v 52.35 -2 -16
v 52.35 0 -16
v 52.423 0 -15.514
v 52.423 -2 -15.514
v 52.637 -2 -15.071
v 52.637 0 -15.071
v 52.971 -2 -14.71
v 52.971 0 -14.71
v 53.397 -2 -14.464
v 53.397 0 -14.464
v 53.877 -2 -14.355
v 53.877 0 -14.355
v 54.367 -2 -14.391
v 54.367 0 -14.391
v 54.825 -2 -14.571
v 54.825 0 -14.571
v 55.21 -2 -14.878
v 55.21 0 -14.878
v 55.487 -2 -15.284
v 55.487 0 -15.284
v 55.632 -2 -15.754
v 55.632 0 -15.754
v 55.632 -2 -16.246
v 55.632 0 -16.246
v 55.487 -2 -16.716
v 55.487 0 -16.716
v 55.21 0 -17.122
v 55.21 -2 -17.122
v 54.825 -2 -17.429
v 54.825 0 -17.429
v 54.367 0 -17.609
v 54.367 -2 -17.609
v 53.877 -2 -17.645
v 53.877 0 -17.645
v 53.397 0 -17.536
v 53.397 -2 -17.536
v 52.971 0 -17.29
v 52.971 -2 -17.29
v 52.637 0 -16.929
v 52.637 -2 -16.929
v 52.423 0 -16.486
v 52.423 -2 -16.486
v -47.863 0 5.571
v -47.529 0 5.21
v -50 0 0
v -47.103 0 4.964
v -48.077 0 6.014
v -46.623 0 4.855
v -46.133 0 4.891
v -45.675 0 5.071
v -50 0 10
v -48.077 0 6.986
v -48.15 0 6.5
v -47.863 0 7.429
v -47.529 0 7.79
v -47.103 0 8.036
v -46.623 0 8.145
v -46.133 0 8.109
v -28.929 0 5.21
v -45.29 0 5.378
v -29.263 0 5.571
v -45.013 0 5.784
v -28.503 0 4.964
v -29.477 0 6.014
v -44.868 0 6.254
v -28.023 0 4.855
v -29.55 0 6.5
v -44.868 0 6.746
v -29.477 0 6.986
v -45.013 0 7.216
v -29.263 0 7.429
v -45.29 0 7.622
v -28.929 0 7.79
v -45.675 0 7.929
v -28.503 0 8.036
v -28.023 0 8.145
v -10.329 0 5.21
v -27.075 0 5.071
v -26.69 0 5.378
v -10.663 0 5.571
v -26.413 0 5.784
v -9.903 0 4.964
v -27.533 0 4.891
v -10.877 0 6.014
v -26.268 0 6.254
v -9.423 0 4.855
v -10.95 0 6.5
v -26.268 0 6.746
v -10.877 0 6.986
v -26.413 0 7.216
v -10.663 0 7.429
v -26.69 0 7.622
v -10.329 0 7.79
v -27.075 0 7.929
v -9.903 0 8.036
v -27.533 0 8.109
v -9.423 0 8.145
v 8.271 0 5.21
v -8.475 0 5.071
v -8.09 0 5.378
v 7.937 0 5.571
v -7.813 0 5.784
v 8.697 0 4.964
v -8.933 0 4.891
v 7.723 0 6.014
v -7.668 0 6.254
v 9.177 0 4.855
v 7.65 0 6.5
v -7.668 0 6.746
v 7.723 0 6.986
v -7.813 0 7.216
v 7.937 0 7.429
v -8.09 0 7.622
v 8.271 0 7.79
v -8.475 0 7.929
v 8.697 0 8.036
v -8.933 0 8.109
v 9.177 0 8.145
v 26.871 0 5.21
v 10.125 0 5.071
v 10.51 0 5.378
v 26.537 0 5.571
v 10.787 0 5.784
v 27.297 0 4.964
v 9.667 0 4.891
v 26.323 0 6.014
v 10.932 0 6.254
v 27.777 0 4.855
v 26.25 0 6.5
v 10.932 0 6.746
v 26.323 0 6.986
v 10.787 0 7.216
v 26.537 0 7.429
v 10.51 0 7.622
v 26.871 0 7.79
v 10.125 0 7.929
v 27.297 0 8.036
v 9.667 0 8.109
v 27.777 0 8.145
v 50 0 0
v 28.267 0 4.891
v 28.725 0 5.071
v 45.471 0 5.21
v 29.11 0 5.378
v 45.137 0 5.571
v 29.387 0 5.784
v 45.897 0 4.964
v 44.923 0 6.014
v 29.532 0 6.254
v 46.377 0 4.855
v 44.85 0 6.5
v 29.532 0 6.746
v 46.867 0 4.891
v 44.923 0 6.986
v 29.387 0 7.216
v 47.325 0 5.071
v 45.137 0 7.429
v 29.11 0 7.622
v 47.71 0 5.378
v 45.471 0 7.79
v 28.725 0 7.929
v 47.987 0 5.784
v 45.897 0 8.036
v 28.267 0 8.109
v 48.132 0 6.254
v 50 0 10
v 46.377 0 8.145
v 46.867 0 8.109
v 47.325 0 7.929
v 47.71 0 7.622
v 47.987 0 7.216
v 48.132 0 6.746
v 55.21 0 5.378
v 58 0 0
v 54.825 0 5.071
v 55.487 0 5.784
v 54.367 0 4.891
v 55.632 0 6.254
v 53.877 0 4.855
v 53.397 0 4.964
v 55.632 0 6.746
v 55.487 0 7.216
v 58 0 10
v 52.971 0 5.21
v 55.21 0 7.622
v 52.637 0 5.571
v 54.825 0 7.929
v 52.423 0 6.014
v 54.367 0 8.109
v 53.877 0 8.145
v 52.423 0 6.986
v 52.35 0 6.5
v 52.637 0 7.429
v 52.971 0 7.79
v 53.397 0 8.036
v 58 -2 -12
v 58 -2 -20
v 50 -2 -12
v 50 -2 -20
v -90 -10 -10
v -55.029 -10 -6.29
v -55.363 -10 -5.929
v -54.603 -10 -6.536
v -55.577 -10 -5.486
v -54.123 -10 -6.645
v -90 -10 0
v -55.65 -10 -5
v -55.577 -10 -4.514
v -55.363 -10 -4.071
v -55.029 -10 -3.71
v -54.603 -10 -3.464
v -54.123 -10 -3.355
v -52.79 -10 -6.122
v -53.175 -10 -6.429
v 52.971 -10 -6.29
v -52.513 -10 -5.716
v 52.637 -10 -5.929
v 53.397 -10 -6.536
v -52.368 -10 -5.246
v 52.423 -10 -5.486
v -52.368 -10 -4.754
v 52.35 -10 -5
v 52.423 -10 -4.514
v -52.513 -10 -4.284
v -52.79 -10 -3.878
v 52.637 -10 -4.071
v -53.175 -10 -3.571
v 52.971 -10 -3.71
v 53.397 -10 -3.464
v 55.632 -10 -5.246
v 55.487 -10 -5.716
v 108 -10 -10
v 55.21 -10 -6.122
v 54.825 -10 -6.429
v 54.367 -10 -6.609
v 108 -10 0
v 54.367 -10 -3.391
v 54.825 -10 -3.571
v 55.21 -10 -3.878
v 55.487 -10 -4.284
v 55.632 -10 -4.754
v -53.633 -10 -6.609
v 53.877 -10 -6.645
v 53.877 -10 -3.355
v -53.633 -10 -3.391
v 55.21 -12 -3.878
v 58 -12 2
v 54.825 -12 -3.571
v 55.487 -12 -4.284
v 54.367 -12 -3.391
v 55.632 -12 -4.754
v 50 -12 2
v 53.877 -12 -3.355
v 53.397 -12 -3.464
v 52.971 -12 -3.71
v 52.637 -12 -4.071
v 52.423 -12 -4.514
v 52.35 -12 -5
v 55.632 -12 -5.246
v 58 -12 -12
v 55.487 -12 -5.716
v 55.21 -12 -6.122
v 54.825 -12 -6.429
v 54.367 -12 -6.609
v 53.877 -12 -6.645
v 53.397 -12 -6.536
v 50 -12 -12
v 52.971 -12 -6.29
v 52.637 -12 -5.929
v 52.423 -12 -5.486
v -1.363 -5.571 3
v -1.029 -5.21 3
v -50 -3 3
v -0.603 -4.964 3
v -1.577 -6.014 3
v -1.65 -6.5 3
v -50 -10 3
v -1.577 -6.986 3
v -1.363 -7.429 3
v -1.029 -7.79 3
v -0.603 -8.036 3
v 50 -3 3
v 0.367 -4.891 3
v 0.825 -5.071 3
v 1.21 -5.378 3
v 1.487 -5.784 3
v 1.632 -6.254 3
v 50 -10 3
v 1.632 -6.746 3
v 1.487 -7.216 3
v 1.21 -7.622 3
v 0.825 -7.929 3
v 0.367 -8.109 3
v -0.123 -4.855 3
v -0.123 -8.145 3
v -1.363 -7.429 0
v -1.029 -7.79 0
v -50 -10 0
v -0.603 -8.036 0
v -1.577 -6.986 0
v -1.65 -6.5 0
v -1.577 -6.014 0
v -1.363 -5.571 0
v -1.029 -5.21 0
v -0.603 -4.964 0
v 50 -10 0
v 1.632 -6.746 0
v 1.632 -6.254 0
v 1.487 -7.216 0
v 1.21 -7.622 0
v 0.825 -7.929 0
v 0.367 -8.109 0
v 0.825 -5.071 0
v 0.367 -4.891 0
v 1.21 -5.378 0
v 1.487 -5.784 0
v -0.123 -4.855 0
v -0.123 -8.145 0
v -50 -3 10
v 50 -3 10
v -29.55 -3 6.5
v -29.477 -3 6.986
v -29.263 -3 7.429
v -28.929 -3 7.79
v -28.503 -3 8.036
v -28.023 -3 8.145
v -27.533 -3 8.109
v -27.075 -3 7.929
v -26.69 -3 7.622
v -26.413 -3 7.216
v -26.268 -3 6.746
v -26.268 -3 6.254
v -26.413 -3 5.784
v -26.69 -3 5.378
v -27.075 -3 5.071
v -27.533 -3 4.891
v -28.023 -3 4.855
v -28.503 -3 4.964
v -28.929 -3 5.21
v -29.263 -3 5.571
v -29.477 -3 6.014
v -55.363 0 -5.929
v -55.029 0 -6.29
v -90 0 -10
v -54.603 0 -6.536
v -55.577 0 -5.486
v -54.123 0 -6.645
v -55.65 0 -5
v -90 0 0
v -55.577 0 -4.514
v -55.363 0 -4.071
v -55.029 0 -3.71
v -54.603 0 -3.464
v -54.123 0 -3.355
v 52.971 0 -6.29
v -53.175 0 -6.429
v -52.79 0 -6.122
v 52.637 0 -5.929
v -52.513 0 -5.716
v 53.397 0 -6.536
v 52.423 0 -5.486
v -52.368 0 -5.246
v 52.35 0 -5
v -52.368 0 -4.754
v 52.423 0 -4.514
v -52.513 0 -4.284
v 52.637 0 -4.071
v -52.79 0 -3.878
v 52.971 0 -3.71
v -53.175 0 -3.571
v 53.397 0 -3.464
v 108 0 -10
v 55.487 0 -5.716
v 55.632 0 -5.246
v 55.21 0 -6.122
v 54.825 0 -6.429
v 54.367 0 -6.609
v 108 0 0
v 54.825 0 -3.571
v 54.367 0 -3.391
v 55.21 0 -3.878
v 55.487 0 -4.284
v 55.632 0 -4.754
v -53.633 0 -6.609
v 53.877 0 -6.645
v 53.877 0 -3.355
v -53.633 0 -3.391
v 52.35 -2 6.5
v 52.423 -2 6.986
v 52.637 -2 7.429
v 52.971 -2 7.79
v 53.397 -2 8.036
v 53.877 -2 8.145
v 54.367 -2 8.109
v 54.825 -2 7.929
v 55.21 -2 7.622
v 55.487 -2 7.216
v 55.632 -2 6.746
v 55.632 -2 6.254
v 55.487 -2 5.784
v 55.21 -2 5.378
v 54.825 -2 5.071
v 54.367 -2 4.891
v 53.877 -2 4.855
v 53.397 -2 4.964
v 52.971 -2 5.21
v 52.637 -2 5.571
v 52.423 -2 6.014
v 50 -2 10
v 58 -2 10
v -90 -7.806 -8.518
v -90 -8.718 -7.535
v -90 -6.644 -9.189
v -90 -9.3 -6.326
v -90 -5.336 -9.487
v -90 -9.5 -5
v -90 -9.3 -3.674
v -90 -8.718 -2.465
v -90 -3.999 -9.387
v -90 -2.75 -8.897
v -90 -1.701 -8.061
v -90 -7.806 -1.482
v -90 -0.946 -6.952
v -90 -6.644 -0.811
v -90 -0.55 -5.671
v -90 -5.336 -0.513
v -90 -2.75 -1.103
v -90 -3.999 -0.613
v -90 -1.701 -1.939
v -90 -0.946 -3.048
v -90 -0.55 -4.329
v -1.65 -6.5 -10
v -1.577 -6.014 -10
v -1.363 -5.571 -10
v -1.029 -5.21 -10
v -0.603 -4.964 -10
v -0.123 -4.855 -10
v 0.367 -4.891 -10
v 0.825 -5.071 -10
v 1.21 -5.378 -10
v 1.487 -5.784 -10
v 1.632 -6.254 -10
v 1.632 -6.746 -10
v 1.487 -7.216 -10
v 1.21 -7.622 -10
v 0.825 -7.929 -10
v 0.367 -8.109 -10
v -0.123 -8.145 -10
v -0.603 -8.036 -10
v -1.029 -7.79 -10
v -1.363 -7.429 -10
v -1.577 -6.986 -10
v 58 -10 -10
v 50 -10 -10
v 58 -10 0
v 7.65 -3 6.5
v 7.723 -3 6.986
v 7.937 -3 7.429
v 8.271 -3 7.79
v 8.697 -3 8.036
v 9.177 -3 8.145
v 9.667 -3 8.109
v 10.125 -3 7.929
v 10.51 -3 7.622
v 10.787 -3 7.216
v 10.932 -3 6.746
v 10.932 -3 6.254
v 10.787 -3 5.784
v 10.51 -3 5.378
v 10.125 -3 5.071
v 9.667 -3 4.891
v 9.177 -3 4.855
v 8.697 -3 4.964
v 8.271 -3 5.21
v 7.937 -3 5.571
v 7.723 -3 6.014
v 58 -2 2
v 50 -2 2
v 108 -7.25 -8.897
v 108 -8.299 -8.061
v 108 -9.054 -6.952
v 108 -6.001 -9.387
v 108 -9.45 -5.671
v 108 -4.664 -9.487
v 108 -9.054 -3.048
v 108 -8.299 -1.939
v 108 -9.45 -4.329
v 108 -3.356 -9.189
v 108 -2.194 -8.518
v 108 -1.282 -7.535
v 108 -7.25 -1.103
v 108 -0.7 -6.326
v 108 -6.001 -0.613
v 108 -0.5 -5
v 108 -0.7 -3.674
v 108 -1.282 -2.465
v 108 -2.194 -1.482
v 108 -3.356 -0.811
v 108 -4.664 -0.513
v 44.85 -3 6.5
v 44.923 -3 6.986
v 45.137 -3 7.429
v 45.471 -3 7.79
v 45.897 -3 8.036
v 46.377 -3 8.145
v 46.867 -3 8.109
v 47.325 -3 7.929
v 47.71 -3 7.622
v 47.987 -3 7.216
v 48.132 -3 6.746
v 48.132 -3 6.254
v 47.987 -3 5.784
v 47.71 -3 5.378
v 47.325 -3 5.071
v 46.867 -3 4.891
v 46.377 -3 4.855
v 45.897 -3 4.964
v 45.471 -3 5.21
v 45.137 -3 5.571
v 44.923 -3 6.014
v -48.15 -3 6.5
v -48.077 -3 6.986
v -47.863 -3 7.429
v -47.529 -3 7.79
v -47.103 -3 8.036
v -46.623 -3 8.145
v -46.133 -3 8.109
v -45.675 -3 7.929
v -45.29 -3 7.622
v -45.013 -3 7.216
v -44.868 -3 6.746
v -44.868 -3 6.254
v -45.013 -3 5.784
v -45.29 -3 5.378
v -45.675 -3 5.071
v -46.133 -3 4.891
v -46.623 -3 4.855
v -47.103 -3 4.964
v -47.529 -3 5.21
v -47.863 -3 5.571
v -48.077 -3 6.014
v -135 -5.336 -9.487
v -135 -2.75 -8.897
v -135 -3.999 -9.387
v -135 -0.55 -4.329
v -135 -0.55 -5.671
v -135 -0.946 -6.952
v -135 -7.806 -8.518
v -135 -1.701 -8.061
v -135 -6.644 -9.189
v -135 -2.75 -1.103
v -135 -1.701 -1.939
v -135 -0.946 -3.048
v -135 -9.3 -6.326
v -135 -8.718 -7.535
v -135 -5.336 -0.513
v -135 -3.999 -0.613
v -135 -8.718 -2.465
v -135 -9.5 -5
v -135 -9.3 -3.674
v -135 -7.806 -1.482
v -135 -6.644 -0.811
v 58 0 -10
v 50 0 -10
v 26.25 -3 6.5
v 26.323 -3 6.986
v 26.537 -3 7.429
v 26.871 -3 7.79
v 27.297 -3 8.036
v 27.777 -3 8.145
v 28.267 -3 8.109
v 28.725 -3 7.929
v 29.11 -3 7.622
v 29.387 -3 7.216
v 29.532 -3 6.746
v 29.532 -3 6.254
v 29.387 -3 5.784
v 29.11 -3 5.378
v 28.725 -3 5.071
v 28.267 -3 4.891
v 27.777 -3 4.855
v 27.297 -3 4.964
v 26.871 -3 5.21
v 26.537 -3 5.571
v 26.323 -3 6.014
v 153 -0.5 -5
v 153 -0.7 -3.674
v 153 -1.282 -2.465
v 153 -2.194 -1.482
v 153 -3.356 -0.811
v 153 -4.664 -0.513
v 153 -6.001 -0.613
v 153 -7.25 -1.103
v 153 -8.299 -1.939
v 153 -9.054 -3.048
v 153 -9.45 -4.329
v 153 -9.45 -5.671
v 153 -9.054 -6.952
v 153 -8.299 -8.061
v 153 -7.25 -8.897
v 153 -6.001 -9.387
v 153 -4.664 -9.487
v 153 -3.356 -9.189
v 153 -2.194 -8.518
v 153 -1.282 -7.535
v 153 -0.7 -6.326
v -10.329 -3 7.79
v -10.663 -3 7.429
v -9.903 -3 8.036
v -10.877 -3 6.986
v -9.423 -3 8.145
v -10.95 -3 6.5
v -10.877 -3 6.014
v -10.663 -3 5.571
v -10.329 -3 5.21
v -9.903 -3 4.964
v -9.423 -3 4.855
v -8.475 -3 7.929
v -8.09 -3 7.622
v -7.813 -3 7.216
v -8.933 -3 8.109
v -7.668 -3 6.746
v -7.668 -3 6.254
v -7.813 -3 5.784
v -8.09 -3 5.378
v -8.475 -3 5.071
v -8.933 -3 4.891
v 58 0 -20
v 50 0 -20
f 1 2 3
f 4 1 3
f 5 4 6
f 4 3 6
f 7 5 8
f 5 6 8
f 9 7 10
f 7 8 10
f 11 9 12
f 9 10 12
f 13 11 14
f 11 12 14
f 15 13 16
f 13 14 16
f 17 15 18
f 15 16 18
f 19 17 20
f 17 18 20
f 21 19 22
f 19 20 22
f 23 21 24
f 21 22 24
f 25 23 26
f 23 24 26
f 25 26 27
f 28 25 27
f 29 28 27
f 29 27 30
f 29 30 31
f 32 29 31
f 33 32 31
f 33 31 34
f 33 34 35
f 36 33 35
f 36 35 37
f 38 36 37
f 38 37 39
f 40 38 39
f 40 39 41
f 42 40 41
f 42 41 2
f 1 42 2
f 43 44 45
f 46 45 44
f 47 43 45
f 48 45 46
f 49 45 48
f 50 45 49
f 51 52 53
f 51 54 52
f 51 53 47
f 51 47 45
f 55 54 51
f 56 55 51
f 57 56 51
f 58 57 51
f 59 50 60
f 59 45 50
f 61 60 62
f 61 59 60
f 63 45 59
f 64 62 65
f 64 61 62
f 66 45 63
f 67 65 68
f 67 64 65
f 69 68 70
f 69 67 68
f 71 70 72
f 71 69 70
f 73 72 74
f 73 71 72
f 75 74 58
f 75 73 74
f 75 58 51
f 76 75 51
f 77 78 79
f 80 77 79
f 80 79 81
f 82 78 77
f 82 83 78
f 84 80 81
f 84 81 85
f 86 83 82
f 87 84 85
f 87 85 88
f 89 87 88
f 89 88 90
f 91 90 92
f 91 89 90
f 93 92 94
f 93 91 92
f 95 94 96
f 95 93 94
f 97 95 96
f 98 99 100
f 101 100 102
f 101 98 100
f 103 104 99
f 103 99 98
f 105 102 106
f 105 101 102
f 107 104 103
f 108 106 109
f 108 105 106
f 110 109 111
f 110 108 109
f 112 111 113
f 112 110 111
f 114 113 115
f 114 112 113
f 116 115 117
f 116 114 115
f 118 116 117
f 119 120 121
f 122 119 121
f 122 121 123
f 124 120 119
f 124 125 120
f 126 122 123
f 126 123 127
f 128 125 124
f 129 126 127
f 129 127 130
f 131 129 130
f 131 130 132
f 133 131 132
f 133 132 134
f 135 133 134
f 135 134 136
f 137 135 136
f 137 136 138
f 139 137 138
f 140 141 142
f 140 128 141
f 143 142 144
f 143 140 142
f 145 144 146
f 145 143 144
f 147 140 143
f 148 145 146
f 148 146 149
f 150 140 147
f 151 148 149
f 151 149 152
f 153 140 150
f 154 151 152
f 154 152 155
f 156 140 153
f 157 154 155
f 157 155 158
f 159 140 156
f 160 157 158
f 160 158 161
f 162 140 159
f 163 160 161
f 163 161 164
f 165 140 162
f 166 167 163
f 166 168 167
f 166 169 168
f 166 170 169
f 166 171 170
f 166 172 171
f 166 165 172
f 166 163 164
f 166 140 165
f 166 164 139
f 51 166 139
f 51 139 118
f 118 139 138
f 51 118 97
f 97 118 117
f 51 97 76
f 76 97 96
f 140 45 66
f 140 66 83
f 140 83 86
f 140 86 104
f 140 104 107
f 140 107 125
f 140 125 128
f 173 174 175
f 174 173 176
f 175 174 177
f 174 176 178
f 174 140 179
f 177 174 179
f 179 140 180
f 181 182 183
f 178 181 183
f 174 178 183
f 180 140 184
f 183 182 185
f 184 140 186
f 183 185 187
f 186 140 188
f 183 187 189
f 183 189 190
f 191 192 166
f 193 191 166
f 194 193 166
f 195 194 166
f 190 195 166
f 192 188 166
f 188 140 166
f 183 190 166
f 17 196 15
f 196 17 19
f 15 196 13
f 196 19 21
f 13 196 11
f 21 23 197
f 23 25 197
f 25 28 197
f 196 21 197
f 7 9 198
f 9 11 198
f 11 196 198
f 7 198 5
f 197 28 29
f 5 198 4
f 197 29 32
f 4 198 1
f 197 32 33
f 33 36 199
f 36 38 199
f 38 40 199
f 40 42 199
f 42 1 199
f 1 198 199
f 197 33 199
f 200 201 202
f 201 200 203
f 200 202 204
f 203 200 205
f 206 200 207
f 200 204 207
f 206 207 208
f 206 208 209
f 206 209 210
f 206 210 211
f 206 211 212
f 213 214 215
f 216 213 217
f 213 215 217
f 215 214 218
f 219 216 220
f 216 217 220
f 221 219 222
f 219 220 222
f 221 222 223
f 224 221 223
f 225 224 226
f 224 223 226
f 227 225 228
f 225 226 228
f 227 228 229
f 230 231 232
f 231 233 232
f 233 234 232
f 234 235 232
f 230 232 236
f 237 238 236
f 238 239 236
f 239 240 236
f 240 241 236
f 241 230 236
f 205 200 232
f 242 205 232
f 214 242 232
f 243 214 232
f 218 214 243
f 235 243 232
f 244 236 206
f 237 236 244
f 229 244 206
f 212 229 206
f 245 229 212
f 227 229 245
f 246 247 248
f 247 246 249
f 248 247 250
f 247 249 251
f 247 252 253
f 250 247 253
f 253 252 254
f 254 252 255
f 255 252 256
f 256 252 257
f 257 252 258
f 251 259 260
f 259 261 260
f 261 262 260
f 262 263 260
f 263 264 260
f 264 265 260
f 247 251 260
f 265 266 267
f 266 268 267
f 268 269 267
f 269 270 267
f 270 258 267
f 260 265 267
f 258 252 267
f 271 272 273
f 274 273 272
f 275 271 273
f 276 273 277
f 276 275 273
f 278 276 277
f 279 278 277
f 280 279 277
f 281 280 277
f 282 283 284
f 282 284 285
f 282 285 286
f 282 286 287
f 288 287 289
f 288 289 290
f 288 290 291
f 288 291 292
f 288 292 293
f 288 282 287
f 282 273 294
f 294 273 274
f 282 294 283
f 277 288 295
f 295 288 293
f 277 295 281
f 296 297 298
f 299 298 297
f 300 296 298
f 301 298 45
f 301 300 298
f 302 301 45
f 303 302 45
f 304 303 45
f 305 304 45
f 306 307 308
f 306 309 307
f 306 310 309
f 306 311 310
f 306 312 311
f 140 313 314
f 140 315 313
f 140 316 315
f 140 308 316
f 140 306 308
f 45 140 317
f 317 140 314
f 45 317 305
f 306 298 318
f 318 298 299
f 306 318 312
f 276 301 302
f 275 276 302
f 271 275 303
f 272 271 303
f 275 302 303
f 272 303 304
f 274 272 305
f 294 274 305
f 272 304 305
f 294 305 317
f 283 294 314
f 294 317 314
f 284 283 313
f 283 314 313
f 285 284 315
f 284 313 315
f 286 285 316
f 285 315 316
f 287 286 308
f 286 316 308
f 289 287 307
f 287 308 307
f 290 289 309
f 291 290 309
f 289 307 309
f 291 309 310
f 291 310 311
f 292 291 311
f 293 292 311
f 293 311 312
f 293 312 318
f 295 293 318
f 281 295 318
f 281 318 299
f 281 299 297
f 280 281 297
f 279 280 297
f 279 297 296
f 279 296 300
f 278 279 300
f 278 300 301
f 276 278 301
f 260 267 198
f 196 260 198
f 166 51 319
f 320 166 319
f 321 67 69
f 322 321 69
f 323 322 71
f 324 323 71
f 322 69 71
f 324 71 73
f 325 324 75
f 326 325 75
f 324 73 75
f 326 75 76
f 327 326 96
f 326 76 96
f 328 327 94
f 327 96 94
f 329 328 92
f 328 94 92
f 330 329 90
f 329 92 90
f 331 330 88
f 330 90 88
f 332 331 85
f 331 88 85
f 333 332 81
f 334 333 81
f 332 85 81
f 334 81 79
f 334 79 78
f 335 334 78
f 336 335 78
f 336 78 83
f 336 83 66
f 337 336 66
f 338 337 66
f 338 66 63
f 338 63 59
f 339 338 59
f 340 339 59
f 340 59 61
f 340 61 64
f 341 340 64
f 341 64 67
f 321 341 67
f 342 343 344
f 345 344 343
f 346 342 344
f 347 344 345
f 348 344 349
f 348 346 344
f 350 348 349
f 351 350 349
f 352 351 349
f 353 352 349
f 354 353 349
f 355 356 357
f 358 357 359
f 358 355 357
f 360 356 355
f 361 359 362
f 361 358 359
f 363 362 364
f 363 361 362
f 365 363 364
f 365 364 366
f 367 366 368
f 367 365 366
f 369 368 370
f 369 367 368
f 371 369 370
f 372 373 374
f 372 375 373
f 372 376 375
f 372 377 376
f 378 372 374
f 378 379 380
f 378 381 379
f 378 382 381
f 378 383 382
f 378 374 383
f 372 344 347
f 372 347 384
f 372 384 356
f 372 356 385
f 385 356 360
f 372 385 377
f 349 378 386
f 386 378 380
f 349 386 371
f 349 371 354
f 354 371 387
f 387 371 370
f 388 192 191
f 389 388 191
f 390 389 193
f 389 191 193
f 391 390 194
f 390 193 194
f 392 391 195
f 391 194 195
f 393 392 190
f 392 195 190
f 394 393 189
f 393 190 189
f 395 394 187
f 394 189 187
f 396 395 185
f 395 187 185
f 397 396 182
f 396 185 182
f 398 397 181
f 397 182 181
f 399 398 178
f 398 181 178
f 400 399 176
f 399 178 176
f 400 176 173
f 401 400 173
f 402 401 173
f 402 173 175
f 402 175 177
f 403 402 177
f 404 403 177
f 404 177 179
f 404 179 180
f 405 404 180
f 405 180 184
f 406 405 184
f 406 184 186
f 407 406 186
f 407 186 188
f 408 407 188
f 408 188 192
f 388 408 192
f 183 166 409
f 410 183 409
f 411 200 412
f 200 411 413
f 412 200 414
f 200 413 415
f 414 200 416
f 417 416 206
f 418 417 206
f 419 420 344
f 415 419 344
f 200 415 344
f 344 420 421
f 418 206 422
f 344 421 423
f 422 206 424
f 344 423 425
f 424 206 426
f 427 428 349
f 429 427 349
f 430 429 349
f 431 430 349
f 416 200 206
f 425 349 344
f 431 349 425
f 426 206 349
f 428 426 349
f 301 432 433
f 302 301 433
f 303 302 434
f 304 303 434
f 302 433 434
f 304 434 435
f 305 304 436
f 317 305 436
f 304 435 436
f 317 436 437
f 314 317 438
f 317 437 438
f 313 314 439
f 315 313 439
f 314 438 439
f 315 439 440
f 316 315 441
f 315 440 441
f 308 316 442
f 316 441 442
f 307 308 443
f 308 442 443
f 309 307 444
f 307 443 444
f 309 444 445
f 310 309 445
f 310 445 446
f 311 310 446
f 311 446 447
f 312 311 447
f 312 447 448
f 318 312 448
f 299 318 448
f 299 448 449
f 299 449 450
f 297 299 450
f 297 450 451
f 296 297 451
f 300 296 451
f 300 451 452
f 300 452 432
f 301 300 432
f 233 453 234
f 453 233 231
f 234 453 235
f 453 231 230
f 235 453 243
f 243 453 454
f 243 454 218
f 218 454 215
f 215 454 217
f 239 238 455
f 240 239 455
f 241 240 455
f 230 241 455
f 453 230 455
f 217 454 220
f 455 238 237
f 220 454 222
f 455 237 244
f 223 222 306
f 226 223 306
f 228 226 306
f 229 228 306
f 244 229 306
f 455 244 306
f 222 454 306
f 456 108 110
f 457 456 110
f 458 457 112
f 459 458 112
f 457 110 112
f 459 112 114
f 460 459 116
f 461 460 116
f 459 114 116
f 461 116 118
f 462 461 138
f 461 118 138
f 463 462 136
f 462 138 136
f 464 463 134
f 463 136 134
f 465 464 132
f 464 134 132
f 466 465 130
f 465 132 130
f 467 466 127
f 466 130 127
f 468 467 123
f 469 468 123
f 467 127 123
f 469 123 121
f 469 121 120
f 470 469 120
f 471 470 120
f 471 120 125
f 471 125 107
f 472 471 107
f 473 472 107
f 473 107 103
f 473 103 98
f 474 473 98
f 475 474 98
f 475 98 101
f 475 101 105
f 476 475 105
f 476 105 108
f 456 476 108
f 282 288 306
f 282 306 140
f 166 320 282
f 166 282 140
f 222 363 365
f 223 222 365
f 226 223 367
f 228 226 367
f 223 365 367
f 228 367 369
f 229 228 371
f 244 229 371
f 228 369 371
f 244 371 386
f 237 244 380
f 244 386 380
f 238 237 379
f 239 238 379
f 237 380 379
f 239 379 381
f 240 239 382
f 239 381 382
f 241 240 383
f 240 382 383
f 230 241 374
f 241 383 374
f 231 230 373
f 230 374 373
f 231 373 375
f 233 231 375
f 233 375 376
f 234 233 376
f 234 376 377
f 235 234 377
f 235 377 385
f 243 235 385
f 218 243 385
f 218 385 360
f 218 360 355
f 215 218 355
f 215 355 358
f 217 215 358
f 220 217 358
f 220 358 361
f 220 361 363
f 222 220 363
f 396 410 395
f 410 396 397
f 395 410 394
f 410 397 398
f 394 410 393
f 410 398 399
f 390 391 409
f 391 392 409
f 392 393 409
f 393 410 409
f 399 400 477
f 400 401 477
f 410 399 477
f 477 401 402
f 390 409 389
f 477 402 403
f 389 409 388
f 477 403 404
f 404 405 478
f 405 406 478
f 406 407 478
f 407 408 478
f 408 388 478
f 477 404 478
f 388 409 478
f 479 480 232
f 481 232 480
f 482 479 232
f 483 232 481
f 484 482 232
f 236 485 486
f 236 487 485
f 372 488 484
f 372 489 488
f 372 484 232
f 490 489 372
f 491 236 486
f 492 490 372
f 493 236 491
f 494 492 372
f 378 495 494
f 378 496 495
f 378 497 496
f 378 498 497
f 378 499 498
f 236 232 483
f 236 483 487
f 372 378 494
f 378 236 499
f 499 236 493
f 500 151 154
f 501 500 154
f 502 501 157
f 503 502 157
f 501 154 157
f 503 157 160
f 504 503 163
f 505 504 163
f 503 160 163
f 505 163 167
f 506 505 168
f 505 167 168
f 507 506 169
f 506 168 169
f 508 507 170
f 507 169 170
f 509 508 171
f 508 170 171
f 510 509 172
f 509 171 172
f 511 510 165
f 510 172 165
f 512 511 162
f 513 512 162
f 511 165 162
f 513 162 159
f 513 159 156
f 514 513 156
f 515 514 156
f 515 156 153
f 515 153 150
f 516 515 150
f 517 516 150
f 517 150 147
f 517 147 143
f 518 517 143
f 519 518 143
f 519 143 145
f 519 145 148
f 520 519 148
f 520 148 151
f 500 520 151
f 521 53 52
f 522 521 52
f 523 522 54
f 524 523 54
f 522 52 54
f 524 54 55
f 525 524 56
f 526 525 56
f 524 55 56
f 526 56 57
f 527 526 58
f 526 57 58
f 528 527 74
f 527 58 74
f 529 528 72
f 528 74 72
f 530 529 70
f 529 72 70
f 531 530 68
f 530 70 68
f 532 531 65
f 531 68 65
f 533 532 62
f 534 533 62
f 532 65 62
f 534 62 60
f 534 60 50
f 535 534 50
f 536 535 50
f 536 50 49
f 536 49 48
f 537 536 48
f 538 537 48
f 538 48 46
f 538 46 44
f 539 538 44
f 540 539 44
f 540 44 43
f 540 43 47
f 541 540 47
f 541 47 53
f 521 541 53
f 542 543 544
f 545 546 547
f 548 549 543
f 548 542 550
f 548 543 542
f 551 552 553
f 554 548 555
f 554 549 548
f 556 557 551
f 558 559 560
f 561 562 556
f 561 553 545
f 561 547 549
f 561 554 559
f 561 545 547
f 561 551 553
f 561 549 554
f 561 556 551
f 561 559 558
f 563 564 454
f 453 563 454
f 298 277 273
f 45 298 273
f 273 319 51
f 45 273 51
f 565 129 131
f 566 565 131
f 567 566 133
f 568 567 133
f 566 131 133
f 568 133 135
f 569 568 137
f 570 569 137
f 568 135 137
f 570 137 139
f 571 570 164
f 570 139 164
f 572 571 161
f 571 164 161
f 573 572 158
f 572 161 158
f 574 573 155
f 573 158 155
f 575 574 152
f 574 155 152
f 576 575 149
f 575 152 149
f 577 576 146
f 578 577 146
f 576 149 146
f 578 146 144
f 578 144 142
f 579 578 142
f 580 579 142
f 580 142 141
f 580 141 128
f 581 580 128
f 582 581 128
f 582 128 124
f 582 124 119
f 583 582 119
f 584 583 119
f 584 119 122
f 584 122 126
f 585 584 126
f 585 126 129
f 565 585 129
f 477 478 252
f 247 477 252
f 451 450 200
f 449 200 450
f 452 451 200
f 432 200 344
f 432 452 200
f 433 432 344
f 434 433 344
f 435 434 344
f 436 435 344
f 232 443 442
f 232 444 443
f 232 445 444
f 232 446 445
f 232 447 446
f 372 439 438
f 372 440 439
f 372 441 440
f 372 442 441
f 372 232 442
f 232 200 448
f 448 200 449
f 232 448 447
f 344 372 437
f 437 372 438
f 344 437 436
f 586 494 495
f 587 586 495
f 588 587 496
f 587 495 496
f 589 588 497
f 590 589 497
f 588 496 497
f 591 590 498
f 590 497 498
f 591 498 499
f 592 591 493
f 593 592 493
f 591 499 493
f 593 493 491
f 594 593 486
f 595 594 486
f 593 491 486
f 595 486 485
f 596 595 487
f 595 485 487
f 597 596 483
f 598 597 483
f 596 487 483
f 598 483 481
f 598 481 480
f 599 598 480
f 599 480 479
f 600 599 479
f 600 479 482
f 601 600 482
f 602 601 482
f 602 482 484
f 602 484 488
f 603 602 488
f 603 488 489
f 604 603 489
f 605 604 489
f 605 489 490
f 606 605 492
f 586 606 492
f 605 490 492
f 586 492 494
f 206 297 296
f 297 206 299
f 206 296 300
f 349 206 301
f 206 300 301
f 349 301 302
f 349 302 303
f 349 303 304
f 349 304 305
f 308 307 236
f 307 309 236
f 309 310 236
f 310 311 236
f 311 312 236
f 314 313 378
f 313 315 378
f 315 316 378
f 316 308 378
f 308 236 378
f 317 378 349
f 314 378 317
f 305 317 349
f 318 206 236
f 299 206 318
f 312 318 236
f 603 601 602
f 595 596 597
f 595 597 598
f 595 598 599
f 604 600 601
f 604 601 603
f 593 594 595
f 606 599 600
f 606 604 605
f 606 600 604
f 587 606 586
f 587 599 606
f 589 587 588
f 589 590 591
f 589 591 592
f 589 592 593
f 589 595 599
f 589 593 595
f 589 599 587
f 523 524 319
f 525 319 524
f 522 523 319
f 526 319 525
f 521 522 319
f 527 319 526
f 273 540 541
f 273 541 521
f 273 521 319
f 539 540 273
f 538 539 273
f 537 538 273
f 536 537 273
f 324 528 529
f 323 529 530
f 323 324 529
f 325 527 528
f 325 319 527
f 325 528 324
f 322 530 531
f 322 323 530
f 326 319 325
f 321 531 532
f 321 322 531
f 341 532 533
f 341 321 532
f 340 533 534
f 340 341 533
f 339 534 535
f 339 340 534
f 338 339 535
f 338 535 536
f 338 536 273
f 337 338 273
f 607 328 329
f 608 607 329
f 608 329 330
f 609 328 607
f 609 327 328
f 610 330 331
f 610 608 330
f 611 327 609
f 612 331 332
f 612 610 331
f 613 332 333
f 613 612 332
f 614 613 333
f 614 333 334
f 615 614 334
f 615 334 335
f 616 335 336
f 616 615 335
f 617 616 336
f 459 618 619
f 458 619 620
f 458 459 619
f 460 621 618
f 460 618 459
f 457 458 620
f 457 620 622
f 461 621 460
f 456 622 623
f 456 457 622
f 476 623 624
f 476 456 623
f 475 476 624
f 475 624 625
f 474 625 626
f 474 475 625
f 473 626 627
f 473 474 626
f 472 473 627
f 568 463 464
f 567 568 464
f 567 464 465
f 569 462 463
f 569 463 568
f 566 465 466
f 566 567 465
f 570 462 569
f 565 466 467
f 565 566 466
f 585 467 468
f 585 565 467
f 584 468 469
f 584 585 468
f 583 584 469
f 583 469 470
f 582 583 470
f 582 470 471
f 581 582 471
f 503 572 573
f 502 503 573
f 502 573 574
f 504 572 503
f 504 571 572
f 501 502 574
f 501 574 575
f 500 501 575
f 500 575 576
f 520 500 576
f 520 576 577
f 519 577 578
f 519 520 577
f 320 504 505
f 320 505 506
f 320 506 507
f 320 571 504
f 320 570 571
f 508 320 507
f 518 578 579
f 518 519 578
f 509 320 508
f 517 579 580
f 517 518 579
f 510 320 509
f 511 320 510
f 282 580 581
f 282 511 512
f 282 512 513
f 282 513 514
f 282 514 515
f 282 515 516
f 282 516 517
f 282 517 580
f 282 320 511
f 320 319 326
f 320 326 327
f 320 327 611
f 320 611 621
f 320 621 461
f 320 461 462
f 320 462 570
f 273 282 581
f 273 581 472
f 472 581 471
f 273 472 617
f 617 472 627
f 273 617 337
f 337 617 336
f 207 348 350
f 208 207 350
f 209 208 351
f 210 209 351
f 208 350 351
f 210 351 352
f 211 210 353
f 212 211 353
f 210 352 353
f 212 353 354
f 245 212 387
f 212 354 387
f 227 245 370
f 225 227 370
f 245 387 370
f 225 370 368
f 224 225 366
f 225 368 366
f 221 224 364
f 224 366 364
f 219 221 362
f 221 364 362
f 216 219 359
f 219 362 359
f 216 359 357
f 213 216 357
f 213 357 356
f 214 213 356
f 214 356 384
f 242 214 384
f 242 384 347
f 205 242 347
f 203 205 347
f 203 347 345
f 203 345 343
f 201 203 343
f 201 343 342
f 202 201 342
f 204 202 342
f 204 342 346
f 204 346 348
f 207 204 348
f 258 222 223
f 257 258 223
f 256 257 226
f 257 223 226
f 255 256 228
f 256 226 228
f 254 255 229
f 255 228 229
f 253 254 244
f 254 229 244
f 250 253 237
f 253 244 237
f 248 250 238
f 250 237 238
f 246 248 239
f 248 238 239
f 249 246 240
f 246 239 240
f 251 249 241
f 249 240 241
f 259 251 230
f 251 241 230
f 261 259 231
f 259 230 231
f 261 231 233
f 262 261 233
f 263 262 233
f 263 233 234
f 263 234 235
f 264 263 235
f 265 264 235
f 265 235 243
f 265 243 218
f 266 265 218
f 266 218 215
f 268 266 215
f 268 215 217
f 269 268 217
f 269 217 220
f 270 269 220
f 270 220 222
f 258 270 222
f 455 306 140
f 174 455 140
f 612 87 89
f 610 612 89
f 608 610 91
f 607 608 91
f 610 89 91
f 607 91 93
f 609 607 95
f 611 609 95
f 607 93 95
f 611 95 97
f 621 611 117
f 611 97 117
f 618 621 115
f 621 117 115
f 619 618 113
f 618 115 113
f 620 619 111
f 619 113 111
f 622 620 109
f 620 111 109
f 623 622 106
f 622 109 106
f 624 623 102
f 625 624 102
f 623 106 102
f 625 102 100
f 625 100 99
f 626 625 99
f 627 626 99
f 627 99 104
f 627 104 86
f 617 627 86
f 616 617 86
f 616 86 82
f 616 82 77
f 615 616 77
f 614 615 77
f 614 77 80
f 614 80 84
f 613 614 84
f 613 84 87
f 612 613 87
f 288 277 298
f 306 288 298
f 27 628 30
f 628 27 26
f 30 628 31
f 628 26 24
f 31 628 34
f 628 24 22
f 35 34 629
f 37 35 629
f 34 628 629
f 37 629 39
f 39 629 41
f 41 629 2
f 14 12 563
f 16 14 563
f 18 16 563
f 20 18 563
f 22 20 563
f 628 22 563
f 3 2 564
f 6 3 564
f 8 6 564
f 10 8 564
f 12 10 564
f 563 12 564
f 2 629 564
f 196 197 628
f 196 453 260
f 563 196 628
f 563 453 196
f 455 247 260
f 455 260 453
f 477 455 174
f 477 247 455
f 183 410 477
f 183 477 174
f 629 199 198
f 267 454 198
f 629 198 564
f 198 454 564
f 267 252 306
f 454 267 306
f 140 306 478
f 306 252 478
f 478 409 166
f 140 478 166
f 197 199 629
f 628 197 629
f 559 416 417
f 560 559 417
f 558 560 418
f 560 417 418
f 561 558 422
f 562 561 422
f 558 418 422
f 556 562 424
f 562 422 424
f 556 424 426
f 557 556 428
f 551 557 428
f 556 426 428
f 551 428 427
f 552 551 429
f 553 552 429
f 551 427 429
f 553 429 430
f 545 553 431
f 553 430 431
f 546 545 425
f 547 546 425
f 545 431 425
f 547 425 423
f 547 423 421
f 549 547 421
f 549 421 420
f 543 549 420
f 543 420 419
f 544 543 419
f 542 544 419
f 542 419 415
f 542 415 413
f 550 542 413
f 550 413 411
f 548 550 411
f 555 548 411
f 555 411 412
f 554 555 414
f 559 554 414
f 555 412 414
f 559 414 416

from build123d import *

# Parameters (mm, degrees)
F1_DEPTH       = 50
F1_DEPTH_BACK  = 50
F2_W           = 10
F2_H           = 10
F3_DEPTH       = 108
F3_DEPTH_BACK  = 90
F4_R           = 4.5
F5_DEPTH       = 45
F6_R           = 4.5
F7_DEPTH       = 45
F9_DEPTH       = 8
F13_D          = 3.3
F13_2_D        = 3.3
F13_3_D        = 3.3
F13_ON_F12_D   = 3.3
F13_ON_F12_2_D = 3.3


with BuildPart() as f1:
    # F0 (on Right) → F1 (new body, two sides)
    with BuildSketch(Plane.YZ) as f1_sk:
        Polygon((0, 0), (0, 10), (-3, 10), (-3, 3), (-10, 3), (-10, 0), align=None)
    extrude(amount=F1_DEPTH)
    extrude(f1_sk.sketch, amount=-F1_DEPTH_BACK)

    # F13 (through all)
    with Locations(Plane.XZ.offset(12)):
        with Locations((-46.5, 6.5), (-27.9, 6.5), (-9.3, 6.5), (9.3, 6.5), (27.9, 6.5), (46.5, 6.5), (54, 6.5), (54, -5), (54, -16), (-54, -5)):
            Hole(F13_D / 2)

    # F13 on F12 (through all)
    with Locations(Plane.XY.offset(3)):
        with Locations((0, -6.5)):
            Hole(F13_ON_F12_D / 2)


with BuildPart() as f3:
    # F2 (on Right) → F3 (new body, two sides)
    with BuildSketch(Plane.YZ) as f3_sk:
        with Locations((-5, -5)):
            Rectangle(F2_W, F2_H)
    extrude(amount=F3_DEPTH)
    extrude(f3_sk.sketch, amount=-F3_DEPTH_BACK)

    # F4 (on face) → F5 (join)
    with BuildSketch(Plane.YZ.offset(108)):
        with Locations((-5, -5)):
            Circle(F4_R)
    extrude(amount=F5_DEPTH)

    # F6 (on face) → F7 (join)
    with BuildSketch(Plane(origin=(-90, 0, 0), x_dir=(0, -1, 0), z_dir=(-1, 0, 0))):
        with Locations((5, -5)):
            Circle(F6_R)
    extrude(amount=F7_DEPTH)

    # F13#2 (through all)
    with Locations(Plane.XZ.offset(12)):
        with Locations((-46.5, 6.5), (-27.9, 6.5), (-9.3, 6.5), (9.3, 6.5), (27.9, 6.5), (46.5, 6.5), (54, 6.5), (54, -5), (54, -16), (-54, -5)):
            Hole(F13_2_D / 2)

    # F13 on F12#2 (through all)
    with Locations(Plane.XY.offset(3)):
        with Locations((0, -6.5)):
            Hole(F13_ON_F12_2_D / 2)


with BuildPart() as f9:
    # F8 (on Right) → F9 (new body)
    with BuildSketch(Plane.YZ):
        Polygon((0, 0), (0, 10), (-2, 10), (-2, 2), (-12, 2), (-12, -5), (-12, -12), (-2, -12), (-2, -20), (0, -20), (0, -10), (-10, -10), (-10, -5), (-10, 0), align=None)
    extrude(amount=F9_DEPTH)


with BuildPart() as f9_1:
    # F10: moved
    add(f9.part.moved(Location((50, 0, 0))))

    # F13#3 (through all)
    with Locations(Plane.XZ.offset(12)):
        with Locations((-46.5, 6.5), (-27.9, 6.5), (-9.3, 6.5), (9.3, 6.5), (27.9, 6.5), (46.5, 6.5), (54, 6.5), (54, -5), (54, -16), (-54, -5)):
            Hole(F13_3_D / 2)


solid = Compound([f1.part, f3.part, f9_1.part])
